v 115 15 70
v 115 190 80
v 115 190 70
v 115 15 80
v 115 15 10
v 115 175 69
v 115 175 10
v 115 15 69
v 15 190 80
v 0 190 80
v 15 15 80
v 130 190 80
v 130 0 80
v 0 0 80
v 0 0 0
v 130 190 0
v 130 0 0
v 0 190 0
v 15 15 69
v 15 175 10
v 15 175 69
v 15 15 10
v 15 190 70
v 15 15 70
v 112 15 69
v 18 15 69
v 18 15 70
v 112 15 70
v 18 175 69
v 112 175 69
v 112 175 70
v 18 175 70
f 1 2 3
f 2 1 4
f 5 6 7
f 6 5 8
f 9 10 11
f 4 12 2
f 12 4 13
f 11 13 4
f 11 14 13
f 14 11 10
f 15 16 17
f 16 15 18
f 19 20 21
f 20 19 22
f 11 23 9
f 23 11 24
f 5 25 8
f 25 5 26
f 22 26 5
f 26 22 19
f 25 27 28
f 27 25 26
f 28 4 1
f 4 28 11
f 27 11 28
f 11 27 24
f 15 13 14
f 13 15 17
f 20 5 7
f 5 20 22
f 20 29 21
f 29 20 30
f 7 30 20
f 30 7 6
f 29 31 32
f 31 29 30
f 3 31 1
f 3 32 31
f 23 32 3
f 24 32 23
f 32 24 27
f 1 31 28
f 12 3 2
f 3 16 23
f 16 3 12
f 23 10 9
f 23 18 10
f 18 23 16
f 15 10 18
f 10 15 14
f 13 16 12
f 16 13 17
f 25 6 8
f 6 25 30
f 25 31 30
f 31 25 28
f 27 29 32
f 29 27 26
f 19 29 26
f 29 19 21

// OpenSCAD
//adjustable height of the box (box should be taller than 30 mm)
h=80;


union (){
translate([65,7.5,h/2]) cube(size = [100,15,h], center = true);
translate([65,95,5]) cube(size = [100,160,10], center = true);
translate([65,182.5,h/2-5]) cube(size = [100,15,h-10], center = true);
translate([7.5,95,h/2]) cube(size = [15,190,h], center=true);
translate([122.5,95,h/2]) cube(size = [15,190,h], center=true);
translate([113.5,95,h-10.5]) cube(size = [3,160,1], center=true);
translate([16.5,95,h-10.5]) cube(size = [3,160,1], center=true);
}
